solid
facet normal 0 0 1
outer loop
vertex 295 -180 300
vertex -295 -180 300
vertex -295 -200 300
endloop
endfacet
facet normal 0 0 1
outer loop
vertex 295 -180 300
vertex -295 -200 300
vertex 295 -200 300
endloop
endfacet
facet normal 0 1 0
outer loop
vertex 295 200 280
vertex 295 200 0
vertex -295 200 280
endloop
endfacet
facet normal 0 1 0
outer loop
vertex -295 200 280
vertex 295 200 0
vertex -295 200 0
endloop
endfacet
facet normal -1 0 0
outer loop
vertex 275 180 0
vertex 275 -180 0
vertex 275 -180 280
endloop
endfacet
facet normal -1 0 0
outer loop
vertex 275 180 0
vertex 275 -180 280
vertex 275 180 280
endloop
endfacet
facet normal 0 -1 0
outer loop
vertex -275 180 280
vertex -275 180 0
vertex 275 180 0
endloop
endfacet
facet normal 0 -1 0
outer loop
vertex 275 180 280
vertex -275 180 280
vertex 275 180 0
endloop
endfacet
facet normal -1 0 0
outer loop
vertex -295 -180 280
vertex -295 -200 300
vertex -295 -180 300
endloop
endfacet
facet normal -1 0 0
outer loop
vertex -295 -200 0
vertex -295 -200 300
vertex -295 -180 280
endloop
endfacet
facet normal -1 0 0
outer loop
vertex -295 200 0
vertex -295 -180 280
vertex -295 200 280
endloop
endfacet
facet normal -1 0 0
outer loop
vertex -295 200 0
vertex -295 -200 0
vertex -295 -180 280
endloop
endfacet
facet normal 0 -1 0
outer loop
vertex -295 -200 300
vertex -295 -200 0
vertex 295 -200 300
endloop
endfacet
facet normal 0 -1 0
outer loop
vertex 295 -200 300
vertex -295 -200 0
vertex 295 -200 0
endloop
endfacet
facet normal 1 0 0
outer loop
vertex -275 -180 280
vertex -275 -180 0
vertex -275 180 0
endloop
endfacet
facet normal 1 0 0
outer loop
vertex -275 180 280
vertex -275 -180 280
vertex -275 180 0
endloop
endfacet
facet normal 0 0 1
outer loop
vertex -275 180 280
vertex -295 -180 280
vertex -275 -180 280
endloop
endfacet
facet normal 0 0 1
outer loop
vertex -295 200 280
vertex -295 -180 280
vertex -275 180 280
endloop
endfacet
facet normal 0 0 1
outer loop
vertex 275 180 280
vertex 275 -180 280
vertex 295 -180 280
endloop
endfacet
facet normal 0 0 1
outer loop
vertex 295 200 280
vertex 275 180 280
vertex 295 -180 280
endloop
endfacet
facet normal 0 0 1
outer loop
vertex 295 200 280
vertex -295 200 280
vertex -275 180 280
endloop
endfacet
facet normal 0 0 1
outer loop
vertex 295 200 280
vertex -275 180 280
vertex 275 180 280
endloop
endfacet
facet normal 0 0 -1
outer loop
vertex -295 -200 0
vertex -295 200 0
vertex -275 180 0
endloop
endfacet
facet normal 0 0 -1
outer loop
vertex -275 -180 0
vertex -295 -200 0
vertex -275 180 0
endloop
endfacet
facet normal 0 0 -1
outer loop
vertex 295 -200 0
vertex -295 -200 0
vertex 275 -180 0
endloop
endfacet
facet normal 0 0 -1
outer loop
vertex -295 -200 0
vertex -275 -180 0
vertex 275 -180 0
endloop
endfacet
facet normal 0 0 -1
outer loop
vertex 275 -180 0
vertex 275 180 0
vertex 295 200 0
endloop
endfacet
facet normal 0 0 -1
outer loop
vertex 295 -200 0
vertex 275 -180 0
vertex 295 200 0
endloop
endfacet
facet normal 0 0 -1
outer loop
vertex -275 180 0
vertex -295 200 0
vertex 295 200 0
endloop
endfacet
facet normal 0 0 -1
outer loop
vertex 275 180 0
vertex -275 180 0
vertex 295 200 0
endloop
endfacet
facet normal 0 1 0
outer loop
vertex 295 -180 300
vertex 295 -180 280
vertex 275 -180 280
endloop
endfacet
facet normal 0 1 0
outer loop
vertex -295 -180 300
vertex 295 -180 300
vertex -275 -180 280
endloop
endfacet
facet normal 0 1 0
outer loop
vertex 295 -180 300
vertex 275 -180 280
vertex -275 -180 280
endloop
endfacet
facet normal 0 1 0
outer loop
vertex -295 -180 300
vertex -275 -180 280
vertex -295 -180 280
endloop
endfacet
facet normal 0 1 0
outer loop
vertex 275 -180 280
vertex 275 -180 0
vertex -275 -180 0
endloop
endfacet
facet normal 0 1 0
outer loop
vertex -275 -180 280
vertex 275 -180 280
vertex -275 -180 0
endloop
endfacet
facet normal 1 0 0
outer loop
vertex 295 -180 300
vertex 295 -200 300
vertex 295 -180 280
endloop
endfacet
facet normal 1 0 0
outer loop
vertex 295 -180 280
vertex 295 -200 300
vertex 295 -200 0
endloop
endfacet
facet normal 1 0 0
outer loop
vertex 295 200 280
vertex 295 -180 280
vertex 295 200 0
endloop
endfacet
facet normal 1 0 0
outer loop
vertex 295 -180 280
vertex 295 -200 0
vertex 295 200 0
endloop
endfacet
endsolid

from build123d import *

# Parameters (mm, degrees)
F0_W     = 20
F0_H     = 20
F0_W_2   = 550
F0_H_2   = 360
F1_DEPTH = 280
F2_DEPTH = 300


with BuildPart() as f1:
    # F0 (on Top) → F1 (new body)
    with BuildSketch(Plane.XY):
        with Locations((-285, 190)):
            Rectangle(F0_W, F0_H)
        with Locations((285, 190)):
            Rectangle(F0_W, F0_H)
        with Locations((0, 190)):
            Rectangle(F0_W_2, F0_H)
        with Locations((-285, 0)):
            Rectangle(F0_W, F0_H_2)
        with Locations((285, 0)):
            Rectangle(F0_W, F0_H_2)
    extrude(amount=F1_DEPTH)

    # F0 (on Top) → F2 (join)
    with BuildSketch(Plane.XY):
        with Locations((-285, -190)):
            Rectangle(F0_W, F0_H)
        with Locations((0, -190)):
            Rectangle(F0_W_2, F0_H)
        with Locations((285, -190)):
            Rectangle(F0_W, F0_H)
    extrude(amount=F2_DEPTH)


solid = f1.part
